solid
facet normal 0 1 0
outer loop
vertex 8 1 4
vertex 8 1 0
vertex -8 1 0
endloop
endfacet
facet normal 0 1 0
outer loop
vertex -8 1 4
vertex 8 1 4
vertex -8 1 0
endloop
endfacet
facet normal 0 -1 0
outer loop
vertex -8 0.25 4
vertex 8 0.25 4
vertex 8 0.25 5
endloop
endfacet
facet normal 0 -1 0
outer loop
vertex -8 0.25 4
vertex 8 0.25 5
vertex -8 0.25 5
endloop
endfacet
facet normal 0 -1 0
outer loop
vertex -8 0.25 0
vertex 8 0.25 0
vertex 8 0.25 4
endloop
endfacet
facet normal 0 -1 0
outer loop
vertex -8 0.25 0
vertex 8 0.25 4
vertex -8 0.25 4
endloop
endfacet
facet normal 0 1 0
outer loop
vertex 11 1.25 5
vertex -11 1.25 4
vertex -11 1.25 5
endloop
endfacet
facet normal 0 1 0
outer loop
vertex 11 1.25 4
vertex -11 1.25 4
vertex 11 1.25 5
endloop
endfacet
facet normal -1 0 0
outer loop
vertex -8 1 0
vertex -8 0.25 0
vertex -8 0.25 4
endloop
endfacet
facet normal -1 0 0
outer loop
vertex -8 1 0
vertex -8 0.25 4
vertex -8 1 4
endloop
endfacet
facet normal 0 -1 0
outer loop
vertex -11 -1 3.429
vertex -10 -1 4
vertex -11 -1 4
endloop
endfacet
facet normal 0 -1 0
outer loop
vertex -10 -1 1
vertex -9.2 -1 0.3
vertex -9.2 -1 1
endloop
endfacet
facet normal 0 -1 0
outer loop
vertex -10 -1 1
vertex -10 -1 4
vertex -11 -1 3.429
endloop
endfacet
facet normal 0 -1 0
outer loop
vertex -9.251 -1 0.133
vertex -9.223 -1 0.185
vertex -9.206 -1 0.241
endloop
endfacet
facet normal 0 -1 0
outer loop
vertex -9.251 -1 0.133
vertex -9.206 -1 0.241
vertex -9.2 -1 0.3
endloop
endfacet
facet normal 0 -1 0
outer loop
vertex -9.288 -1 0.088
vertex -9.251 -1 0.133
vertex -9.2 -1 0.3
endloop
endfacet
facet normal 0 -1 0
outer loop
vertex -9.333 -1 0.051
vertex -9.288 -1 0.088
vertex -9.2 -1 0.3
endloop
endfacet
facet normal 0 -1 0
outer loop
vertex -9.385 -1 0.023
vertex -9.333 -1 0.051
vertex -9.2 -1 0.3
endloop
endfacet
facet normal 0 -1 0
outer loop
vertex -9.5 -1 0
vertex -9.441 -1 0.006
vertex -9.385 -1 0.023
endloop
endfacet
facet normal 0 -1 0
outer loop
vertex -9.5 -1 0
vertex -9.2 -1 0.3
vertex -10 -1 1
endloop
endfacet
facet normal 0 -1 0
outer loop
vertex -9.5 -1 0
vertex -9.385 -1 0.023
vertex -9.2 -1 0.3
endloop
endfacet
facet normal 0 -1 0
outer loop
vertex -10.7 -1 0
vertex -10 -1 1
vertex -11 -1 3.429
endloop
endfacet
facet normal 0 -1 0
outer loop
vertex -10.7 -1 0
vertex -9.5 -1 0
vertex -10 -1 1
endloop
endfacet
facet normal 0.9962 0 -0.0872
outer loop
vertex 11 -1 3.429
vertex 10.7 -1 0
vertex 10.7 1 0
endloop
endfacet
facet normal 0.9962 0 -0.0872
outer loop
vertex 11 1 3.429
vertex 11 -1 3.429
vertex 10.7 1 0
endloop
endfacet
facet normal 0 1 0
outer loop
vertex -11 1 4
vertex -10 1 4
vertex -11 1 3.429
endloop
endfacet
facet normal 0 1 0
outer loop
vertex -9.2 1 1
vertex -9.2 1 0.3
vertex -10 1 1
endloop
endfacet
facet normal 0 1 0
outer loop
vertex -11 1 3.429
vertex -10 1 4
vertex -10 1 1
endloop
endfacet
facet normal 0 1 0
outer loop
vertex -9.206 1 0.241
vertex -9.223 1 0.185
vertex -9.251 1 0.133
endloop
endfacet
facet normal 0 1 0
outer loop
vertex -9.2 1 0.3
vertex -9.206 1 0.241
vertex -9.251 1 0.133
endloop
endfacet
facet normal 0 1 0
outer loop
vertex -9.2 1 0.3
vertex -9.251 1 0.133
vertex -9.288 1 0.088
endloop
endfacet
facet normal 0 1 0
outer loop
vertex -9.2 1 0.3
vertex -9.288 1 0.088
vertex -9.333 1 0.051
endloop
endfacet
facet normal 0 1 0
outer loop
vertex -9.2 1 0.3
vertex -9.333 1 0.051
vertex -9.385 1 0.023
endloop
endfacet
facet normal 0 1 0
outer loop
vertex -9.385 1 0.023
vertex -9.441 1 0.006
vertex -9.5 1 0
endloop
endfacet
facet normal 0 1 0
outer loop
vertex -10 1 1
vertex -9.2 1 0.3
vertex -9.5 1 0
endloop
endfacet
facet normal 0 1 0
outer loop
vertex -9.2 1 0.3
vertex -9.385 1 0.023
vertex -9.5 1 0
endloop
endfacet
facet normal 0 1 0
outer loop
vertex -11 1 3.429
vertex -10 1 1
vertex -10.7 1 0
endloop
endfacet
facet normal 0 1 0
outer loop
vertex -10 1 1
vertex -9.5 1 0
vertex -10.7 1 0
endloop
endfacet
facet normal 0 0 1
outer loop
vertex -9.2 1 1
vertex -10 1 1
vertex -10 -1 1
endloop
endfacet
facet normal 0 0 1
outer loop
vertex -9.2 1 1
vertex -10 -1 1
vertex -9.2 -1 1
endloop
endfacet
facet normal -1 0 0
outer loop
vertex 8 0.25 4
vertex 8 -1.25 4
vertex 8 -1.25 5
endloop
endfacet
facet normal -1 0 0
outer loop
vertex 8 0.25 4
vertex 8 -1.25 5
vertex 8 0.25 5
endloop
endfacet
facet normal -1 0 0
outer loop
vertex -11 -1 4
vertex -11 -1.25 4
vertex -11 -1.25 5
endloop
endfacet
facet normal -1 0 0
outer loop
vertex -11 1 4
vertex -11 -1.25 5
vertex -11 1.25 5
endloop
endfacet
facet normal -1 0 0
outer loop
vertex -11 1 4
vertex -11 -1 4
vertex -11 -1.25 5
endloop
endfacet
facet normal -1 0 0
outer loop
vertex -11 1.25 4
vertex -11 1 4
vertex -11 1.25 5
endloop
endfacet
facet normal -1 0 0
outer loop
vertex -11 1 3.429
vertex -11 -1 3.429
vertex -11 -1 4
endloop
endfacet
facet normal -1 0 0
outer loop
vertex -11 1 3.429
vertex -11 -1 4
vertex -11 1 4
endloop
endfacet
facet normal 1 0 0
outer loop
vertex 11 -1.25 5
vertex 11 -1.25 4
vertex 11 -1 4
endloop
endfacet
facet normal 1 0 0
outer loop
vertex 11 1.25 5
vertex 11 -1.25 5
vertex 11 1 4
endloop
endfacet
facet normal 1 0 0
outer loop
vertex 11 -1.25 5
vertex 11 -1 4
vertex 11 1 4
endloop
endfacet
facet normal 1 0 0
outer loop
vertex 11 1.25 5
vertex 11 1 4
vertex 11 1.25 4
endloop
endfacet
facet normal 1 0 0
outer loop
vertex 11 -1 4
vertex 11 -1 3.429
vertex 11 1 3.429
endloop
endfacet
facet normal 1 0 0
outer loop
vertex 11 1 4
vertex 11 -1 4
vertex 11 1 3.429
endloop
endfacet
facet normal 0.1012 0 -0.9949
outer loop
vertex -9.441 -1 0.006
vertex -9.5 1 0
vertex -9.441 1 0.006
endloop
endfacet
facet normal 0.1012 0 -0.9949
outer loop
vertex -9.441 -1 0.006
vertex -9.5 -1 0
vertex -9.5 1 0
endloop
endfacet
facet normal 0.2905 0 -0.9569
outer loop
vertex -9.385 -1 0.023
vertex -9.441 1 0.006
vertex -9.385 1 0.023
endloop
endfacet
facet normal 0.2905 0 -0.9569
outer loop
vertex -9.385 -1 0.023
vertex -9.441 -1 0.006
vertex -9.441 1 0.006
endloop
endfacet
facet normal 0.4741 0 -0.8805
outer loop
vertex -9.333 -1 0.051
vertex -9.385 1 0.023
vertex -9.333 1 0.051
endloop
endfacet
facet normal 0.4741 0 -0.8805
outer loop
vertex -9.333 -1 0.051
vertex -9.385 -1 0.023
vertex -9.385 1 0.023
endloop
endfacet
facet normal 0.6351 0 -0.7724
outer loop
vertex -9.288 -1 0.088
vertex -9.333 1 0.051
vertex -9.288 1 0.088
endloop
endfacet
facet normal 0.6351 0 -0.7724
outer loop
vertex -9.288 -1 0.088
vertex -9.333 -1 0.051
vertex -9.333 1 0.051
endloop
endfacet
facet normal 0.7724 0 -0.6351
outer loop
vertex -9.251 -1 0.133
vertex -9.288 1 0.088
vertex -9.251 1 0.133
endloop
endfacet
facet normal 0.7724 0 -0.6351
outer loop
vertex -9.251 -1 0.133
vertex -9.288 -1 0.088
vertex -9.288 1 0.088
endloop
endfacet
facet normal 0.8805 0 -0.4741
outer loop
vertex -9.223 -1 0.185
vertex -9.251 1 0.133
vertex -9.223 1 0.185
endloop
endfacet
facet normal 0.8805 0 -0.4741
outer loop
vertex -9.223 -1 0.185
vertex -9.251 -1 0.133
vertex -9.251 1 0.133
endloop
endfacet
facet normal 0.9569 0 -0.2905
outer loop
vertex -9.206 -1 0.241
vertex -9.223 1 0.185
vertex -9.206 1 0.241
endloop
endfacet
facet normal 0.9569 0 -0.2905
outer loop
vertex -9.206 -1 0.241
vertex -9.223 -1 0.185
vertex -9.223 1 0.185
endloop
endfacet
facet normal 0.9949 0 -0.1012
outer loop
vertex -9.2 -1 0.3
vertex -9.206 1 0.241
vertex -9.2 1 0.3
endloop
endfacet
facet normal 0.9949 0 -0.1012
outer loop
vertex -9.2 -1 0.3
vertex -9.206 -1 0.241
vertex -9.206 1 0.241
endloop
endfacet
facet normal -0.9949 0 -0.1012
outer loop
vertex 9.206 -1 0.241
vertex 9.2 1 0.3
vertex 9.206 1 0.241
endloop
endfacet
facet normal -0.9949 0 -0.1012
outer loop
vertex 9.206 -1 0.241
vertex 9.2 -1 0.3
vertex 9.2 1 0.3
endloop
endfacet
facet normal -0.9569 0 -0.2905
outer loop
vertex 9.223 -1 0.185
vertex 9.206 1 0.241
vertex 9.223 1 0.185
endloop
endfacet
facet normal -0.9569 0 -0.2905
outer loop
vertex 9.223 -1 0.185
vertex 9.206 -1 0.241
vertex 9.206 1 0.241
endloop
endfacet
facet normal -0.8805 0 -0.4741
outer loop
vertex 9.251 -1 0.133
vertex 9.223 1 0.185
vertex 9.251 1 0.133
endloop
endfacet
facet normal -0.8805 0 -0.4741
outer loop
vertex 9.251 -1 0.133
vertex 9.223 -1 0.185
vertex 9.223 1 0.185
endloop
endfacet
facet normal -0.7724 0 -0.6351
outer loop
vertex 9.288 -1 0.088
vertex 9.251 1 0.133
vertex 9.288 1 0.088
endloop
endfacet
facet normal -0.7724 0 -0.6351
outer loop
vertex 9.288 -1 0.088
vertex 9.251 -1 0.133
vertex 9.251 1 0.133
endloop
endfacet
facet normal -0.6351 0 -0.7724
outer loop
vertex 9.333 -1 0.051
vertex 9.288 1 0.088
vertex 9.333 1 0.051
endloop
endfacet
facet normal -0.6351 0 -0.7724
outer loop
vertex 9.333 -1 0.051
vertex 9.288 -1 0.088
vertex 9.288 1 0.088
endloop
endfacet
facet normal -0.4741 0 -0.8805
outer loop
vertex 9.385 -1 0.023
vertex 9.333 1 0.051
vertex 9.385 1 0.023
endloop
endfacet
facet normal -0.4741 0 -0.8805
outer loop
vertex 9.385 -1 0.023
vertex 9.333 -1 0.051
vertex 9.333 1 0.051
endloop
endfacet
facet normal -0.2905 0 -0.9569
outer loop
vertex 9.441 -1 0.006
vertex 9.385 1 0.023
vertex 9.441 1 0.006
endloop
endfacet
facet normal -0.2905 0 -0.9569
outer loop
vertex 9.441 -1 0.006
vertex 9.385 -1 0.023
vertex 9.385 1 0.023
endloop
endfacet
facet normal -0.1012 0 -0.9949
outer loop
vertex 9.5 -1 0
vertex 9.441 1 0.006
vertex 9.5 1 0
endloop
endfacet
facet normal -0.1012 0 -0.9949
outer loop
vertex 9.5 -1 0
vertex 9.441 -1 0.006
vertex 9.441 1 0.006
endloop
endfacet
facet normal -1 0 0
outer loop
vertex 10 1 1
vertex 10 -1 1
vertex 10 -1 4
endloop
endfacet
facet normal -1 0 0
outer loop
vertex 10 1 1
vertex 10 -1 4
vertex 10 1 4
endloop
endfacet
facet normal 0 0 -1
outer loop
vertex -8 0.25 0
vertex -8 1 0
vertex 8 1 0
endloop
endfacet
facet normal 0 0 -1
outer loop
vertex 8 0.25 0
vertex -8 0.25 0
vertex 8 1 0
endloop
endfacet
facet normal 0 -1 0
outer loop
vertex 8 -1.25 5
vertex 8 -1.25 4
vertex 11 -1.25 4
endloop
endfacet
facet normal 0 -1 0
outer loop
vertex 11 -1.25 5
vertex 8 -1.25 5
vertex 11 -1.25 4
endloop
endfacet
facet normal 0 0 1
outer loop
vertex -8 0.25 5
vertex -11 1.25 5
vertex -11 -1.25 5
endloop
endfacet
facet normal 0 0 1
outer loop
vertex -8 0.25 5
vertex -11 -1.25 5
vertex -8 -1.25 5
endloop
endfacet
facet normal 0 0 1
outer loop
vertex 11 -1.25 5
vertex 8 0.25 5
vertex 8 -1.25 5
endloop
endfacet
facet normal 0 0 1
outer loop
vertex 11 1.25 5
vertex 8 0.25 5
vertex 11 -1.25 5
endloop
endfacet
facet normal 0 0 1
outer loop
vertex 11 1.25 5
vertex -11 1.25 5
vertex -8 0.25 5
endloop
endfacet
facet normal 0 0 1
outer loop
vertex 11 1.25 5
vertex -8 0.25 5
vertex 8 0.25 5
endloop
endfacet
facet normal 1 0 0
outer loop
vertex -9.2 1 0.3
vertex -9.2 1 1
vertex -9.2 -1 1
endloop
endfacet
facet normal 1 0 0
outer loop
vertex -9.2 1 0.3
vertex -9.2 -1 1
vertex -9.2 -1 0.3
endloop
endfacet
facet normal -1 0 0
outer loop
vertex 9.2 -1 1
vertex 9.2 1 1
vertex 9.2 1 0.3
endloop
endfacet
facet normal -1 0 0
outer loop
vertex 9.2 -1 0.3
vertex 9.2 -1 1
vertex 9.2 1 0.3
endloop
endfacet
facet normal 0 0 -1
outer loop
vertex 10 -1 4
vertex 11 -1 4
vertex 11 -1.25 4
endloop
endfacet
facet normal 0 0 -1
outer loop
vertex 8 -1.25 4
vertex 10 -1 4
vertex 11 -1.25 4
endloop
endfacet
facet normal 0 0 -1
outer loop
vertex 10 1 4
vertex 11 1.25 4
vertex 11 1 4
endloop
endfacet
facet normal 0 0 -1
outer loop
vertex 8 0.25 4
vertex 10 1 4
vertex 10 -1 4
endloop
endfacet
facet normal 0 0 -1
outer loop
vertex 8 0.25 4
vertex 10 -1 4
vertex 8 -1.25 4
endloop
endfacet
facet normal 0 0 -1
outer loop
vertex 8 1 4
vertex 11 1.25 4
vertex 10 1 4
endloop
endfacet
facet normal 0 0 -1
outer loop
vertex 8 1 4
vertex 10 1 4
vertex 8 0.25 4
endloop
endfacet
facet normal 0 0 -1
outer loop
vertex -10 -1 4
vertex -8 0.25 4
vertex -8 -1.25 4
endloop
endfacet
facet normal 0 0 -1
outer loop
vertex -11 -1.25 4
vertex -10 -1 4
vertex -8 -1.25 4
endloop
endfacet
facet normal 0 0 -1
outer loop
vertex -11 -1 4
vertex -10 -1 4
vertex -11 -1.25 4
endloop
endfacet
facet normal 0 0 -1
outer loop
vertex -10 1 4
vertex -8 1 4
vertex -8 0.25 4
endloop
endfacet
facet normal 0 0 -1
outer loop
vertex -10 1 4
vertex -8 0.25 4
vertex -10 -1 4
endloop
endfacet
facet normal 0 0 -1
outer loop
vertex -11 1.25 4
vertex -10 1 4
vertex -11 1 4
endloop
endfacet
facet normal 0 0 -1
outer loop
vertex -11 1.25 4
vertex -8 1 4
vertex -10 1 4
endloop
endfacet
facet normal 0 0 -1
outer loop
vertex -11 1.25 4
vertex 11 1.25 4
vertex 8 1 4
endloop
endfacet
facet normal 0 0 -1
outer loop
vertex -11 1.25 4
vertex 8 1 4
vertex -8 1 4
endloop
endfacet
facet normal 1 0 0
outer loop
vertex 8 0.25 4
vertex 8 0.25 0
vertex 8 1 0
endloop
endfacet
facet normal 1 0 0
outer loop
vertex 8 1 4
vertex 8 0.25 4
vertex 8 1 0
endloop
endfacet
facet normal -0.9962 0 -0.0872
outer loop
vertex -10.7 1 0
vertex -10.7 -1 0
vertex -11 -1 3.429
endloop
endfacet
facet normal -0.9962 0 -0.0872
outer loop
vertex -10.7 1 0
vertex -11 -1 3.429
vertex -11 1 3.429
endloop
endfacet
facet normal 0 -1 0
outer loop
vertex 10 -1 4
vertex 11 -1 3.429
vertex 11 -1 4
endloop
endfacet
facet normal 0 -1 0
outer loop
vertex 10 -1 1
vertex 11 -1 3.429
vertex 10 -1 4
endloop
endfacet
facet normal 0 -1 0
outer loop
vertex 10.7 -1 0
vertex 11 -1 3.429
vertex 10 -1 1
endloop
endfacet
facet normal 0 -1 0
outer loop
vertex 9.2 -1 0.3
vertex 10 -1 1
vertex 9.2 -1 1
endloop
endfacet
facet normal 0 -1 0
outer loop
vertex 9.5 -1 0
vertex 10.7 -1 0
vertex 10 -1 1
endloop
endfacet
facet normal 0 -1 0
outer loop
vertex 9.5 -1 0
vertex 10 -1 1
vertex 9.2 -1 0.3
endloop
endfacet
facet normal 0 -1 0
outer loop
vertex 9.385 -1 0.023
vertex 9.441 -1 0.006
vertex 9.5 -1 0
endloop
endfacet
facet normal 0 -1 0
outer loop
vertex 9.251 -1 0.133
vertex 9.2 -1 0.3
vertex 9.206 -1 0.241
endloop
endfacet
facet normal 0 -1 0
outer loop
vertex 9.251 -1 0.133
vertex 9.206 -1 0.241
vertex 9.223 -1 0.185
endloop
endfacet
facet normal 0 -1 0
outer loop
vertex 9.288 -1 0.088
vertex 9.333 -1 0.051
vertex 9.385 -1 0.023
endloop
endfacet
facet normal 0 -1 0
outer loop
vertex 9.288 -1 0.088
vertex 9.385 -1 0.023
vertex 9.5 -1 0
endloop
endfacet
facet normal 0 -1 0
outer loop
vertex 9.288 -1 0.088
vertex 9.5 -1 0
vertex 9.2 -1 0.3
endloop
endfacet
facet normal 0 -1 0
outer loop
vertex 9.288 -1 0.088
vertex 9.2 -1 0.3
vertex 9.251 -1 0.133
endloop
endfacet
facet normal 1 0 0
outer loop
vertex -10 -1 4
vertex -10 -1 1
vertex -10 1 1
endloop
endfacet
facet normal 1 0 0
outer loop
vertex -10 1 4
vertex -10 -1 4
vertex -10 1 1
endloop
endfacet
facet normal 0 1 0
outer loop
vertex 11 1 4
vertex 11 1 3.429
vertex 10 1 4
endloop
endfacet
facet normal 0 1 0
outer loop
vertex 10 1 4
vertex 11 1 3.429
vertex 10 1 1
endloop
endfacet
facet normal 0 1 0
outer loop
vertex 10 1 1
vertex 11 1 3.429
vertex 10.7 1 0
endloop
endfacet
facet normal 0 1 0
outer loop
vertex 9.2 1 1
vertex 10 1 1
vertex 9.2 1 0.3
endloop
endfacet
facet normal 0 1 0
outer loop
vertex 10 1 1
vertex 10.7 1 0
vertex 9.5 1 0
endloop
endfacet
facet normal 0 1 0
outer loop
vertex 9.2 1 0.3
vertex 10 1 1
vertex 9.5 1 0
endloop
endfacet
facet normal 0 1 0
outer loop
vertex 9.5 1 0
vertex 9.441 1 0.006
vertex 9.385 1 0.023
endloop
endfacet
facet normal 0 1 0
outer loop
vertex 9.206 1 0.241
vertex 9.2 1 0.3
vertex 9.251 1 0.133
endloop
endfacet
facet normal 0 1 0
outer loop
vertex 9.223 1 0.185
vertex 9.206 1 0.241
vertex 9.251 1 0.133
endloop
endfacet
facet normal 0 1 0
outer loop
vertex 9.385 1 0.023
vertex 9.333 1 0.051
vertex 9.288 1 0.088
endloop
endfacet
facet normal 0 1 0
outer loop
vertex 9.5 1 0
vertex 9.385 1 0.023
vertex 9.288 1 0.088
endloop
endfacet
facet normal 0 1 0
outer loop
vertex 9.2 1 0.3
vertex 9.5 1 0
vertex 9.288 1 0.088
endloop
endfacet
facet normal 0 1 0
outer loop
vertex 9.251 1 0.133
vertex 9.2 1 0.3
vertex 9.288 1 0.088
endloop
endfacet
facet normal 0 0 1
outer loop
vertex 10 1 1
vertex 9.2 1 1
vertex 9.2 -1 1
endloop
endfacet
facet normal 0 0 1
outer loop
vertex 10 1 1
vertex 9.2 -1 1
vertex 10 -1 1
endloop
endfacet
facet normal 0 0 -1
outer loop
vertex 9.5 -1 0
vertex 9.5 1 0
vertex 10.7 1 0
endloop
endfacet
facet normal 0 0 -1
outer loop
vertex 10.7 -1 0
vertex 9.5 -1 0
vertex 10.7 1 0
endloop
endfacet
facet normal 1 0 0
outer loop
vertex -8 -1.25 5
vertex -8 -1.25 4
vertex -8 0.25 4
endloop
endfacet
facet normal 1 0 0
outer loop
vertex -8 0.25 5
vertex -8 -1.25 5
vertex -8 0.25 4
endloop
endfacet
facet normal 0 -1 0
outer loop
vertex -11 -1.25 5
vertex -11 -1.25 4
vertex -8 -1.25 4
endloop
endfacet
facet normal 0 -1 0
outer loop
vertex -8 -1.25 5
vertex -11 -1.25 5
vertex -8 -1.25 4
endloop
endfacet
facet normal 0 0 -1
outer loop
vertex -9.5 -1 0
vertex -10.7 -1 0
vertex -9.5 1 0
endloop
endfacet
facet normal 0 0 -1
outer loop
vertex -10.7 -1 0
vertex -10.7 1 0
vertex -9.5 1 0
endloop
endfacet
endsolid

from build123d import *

# Parameters (mm, degrees)
SKETCH1_W             = 22
SKETCH1_H             = 2.5
BOSS_EXTRUDE1_DEPTH   = 5
SKETCH2_W             = 22
SKETCH2_H             = 0.25
CUT_EXTRUDE1_DEPTH    = 4
SKETCH3_W             = 2
SKETCH3_H             = 2
CUT_EXTRUDE2_DEPTH    = 4
SKETCH5_W             = 16
SKETCH5_H             = 1.5
CUT_EXTRUDE3_DEPTH    = 5
SKETCH6_W             = 1.8
SKETCH6_H             = 1
BOSS_EXTRUDE2_DEPTH   = 2
FILLET1_R             = 0.3
CHAMFER1_SIZE2        = 0.3
CHAMFER1_SIZE         = 3.429015691
CHAMFER1_EDGE_2_SIZE2 = 0.3
CHAMFER1_EDGE_2_SIZE  = 3.429015691


with BuildPart() as part:
    # Sketch1 → Boss-Extrude1 (new body)
    with BuildSketch(Plane.XY):
        Rectangle(SKETCH1_W, SKETCH1_H)
    extrude(amount=BOSS_EXTRUDE1_DEPTH)

    # Sketch2 → Cut-Extrude1 (cut)
    with BuildSketch(Plane(origin=(0, 0, 0), x_dir=(-1, 0, 0), z_dir=(0, 0, -1))):
        with Locations((0, 1.125)):
            Rectangle(SKETCH2_W, SKETCH2_H)
        with Locations((0, -1.125)):
            Rectangle(SKETCH2_W, SKETCH2_H)
    extrude(amount=-CUT_EXTRUDE1_DEPTH, mode=Mode.SUBTRACT)

    # Sketch3 → Cut-Extrude2 (cut)
    with BuildSketch(Plane(origin=(0, 0, 0), x_dir=(-1, 0, 0), z_dir=(0, 0, -1))):
        with Locations((-9, 0)):
            Rectangle(SKETCH3_W, SKETCH3_H)
        with Locations((9, 0)):
            Rectangle(SKETCH3_W, SKETCH3_H)
    extrude(amount=-CUT_EXTRUDE2_DEPTH, mode=Mode.SUBTRACT)

    # Sketch5 → Cut-Extrude3 (cut)
    with BuildSketch(Plane(origin=(0, 0, 0), x_dir=(-1, 0, 0), z_dir=(0, 0, -1))):
        with Locations((0, -0.5)):
            Rectangle(SKETCH5_W, SKETCH5_H)
    extrude(amount=-CUT_EXTRUDE3_DEPTH, mode=Mode.SUBTRACT)

    # Sketch6 → Boss-Extrude2 (add)
    with BuildSketch(Plane(origin=(0, 1, 0), x_dir=(1, 0, 0), z_dir=(0, 1, 0))):
        with Locations((-10.1, -0.5)):
            Rectangle(SKETCH6_W, SKETCH6_H)
        with Locations((10.1, -0.5)):
            Rectangle(SKETCH6_W, SKETCH6_H)
    extrude(amount=-BOSS_EXTRUDE2_DEPTH)

    # Fillet1
    fillet1_edges = [part.edges().sort_by_distance(p)[0] for p in [
        (-9.2, 0, 0),
        (9.2, 0, 0),
    ]]
    fillet(fillet1_edges, radius=FILLET1_R)

    # Chamfer1
    chamfer1_edges = [part.edges().sort_by_distance(p)[0] for p in [
        (11, 0, 0),
    ]]
    chamfer(chamfer1_edges, length=CHAMFER1_SIZE, length2=CHAMFER1_SIZE2)

    # Chamfer1 edge 2
    chamfer1_edge_2_edges = [part.edges().sort_by_distance(p)[0] for p in [
        (-11, 0, 0),
    ]]
    chamfer(chamfer1_edge_2_edges, length=CHAMFER1_EDGE_2_SIZE, length2=CHAMFER1_EDGE_2_SIZE2)


solid = part.part
